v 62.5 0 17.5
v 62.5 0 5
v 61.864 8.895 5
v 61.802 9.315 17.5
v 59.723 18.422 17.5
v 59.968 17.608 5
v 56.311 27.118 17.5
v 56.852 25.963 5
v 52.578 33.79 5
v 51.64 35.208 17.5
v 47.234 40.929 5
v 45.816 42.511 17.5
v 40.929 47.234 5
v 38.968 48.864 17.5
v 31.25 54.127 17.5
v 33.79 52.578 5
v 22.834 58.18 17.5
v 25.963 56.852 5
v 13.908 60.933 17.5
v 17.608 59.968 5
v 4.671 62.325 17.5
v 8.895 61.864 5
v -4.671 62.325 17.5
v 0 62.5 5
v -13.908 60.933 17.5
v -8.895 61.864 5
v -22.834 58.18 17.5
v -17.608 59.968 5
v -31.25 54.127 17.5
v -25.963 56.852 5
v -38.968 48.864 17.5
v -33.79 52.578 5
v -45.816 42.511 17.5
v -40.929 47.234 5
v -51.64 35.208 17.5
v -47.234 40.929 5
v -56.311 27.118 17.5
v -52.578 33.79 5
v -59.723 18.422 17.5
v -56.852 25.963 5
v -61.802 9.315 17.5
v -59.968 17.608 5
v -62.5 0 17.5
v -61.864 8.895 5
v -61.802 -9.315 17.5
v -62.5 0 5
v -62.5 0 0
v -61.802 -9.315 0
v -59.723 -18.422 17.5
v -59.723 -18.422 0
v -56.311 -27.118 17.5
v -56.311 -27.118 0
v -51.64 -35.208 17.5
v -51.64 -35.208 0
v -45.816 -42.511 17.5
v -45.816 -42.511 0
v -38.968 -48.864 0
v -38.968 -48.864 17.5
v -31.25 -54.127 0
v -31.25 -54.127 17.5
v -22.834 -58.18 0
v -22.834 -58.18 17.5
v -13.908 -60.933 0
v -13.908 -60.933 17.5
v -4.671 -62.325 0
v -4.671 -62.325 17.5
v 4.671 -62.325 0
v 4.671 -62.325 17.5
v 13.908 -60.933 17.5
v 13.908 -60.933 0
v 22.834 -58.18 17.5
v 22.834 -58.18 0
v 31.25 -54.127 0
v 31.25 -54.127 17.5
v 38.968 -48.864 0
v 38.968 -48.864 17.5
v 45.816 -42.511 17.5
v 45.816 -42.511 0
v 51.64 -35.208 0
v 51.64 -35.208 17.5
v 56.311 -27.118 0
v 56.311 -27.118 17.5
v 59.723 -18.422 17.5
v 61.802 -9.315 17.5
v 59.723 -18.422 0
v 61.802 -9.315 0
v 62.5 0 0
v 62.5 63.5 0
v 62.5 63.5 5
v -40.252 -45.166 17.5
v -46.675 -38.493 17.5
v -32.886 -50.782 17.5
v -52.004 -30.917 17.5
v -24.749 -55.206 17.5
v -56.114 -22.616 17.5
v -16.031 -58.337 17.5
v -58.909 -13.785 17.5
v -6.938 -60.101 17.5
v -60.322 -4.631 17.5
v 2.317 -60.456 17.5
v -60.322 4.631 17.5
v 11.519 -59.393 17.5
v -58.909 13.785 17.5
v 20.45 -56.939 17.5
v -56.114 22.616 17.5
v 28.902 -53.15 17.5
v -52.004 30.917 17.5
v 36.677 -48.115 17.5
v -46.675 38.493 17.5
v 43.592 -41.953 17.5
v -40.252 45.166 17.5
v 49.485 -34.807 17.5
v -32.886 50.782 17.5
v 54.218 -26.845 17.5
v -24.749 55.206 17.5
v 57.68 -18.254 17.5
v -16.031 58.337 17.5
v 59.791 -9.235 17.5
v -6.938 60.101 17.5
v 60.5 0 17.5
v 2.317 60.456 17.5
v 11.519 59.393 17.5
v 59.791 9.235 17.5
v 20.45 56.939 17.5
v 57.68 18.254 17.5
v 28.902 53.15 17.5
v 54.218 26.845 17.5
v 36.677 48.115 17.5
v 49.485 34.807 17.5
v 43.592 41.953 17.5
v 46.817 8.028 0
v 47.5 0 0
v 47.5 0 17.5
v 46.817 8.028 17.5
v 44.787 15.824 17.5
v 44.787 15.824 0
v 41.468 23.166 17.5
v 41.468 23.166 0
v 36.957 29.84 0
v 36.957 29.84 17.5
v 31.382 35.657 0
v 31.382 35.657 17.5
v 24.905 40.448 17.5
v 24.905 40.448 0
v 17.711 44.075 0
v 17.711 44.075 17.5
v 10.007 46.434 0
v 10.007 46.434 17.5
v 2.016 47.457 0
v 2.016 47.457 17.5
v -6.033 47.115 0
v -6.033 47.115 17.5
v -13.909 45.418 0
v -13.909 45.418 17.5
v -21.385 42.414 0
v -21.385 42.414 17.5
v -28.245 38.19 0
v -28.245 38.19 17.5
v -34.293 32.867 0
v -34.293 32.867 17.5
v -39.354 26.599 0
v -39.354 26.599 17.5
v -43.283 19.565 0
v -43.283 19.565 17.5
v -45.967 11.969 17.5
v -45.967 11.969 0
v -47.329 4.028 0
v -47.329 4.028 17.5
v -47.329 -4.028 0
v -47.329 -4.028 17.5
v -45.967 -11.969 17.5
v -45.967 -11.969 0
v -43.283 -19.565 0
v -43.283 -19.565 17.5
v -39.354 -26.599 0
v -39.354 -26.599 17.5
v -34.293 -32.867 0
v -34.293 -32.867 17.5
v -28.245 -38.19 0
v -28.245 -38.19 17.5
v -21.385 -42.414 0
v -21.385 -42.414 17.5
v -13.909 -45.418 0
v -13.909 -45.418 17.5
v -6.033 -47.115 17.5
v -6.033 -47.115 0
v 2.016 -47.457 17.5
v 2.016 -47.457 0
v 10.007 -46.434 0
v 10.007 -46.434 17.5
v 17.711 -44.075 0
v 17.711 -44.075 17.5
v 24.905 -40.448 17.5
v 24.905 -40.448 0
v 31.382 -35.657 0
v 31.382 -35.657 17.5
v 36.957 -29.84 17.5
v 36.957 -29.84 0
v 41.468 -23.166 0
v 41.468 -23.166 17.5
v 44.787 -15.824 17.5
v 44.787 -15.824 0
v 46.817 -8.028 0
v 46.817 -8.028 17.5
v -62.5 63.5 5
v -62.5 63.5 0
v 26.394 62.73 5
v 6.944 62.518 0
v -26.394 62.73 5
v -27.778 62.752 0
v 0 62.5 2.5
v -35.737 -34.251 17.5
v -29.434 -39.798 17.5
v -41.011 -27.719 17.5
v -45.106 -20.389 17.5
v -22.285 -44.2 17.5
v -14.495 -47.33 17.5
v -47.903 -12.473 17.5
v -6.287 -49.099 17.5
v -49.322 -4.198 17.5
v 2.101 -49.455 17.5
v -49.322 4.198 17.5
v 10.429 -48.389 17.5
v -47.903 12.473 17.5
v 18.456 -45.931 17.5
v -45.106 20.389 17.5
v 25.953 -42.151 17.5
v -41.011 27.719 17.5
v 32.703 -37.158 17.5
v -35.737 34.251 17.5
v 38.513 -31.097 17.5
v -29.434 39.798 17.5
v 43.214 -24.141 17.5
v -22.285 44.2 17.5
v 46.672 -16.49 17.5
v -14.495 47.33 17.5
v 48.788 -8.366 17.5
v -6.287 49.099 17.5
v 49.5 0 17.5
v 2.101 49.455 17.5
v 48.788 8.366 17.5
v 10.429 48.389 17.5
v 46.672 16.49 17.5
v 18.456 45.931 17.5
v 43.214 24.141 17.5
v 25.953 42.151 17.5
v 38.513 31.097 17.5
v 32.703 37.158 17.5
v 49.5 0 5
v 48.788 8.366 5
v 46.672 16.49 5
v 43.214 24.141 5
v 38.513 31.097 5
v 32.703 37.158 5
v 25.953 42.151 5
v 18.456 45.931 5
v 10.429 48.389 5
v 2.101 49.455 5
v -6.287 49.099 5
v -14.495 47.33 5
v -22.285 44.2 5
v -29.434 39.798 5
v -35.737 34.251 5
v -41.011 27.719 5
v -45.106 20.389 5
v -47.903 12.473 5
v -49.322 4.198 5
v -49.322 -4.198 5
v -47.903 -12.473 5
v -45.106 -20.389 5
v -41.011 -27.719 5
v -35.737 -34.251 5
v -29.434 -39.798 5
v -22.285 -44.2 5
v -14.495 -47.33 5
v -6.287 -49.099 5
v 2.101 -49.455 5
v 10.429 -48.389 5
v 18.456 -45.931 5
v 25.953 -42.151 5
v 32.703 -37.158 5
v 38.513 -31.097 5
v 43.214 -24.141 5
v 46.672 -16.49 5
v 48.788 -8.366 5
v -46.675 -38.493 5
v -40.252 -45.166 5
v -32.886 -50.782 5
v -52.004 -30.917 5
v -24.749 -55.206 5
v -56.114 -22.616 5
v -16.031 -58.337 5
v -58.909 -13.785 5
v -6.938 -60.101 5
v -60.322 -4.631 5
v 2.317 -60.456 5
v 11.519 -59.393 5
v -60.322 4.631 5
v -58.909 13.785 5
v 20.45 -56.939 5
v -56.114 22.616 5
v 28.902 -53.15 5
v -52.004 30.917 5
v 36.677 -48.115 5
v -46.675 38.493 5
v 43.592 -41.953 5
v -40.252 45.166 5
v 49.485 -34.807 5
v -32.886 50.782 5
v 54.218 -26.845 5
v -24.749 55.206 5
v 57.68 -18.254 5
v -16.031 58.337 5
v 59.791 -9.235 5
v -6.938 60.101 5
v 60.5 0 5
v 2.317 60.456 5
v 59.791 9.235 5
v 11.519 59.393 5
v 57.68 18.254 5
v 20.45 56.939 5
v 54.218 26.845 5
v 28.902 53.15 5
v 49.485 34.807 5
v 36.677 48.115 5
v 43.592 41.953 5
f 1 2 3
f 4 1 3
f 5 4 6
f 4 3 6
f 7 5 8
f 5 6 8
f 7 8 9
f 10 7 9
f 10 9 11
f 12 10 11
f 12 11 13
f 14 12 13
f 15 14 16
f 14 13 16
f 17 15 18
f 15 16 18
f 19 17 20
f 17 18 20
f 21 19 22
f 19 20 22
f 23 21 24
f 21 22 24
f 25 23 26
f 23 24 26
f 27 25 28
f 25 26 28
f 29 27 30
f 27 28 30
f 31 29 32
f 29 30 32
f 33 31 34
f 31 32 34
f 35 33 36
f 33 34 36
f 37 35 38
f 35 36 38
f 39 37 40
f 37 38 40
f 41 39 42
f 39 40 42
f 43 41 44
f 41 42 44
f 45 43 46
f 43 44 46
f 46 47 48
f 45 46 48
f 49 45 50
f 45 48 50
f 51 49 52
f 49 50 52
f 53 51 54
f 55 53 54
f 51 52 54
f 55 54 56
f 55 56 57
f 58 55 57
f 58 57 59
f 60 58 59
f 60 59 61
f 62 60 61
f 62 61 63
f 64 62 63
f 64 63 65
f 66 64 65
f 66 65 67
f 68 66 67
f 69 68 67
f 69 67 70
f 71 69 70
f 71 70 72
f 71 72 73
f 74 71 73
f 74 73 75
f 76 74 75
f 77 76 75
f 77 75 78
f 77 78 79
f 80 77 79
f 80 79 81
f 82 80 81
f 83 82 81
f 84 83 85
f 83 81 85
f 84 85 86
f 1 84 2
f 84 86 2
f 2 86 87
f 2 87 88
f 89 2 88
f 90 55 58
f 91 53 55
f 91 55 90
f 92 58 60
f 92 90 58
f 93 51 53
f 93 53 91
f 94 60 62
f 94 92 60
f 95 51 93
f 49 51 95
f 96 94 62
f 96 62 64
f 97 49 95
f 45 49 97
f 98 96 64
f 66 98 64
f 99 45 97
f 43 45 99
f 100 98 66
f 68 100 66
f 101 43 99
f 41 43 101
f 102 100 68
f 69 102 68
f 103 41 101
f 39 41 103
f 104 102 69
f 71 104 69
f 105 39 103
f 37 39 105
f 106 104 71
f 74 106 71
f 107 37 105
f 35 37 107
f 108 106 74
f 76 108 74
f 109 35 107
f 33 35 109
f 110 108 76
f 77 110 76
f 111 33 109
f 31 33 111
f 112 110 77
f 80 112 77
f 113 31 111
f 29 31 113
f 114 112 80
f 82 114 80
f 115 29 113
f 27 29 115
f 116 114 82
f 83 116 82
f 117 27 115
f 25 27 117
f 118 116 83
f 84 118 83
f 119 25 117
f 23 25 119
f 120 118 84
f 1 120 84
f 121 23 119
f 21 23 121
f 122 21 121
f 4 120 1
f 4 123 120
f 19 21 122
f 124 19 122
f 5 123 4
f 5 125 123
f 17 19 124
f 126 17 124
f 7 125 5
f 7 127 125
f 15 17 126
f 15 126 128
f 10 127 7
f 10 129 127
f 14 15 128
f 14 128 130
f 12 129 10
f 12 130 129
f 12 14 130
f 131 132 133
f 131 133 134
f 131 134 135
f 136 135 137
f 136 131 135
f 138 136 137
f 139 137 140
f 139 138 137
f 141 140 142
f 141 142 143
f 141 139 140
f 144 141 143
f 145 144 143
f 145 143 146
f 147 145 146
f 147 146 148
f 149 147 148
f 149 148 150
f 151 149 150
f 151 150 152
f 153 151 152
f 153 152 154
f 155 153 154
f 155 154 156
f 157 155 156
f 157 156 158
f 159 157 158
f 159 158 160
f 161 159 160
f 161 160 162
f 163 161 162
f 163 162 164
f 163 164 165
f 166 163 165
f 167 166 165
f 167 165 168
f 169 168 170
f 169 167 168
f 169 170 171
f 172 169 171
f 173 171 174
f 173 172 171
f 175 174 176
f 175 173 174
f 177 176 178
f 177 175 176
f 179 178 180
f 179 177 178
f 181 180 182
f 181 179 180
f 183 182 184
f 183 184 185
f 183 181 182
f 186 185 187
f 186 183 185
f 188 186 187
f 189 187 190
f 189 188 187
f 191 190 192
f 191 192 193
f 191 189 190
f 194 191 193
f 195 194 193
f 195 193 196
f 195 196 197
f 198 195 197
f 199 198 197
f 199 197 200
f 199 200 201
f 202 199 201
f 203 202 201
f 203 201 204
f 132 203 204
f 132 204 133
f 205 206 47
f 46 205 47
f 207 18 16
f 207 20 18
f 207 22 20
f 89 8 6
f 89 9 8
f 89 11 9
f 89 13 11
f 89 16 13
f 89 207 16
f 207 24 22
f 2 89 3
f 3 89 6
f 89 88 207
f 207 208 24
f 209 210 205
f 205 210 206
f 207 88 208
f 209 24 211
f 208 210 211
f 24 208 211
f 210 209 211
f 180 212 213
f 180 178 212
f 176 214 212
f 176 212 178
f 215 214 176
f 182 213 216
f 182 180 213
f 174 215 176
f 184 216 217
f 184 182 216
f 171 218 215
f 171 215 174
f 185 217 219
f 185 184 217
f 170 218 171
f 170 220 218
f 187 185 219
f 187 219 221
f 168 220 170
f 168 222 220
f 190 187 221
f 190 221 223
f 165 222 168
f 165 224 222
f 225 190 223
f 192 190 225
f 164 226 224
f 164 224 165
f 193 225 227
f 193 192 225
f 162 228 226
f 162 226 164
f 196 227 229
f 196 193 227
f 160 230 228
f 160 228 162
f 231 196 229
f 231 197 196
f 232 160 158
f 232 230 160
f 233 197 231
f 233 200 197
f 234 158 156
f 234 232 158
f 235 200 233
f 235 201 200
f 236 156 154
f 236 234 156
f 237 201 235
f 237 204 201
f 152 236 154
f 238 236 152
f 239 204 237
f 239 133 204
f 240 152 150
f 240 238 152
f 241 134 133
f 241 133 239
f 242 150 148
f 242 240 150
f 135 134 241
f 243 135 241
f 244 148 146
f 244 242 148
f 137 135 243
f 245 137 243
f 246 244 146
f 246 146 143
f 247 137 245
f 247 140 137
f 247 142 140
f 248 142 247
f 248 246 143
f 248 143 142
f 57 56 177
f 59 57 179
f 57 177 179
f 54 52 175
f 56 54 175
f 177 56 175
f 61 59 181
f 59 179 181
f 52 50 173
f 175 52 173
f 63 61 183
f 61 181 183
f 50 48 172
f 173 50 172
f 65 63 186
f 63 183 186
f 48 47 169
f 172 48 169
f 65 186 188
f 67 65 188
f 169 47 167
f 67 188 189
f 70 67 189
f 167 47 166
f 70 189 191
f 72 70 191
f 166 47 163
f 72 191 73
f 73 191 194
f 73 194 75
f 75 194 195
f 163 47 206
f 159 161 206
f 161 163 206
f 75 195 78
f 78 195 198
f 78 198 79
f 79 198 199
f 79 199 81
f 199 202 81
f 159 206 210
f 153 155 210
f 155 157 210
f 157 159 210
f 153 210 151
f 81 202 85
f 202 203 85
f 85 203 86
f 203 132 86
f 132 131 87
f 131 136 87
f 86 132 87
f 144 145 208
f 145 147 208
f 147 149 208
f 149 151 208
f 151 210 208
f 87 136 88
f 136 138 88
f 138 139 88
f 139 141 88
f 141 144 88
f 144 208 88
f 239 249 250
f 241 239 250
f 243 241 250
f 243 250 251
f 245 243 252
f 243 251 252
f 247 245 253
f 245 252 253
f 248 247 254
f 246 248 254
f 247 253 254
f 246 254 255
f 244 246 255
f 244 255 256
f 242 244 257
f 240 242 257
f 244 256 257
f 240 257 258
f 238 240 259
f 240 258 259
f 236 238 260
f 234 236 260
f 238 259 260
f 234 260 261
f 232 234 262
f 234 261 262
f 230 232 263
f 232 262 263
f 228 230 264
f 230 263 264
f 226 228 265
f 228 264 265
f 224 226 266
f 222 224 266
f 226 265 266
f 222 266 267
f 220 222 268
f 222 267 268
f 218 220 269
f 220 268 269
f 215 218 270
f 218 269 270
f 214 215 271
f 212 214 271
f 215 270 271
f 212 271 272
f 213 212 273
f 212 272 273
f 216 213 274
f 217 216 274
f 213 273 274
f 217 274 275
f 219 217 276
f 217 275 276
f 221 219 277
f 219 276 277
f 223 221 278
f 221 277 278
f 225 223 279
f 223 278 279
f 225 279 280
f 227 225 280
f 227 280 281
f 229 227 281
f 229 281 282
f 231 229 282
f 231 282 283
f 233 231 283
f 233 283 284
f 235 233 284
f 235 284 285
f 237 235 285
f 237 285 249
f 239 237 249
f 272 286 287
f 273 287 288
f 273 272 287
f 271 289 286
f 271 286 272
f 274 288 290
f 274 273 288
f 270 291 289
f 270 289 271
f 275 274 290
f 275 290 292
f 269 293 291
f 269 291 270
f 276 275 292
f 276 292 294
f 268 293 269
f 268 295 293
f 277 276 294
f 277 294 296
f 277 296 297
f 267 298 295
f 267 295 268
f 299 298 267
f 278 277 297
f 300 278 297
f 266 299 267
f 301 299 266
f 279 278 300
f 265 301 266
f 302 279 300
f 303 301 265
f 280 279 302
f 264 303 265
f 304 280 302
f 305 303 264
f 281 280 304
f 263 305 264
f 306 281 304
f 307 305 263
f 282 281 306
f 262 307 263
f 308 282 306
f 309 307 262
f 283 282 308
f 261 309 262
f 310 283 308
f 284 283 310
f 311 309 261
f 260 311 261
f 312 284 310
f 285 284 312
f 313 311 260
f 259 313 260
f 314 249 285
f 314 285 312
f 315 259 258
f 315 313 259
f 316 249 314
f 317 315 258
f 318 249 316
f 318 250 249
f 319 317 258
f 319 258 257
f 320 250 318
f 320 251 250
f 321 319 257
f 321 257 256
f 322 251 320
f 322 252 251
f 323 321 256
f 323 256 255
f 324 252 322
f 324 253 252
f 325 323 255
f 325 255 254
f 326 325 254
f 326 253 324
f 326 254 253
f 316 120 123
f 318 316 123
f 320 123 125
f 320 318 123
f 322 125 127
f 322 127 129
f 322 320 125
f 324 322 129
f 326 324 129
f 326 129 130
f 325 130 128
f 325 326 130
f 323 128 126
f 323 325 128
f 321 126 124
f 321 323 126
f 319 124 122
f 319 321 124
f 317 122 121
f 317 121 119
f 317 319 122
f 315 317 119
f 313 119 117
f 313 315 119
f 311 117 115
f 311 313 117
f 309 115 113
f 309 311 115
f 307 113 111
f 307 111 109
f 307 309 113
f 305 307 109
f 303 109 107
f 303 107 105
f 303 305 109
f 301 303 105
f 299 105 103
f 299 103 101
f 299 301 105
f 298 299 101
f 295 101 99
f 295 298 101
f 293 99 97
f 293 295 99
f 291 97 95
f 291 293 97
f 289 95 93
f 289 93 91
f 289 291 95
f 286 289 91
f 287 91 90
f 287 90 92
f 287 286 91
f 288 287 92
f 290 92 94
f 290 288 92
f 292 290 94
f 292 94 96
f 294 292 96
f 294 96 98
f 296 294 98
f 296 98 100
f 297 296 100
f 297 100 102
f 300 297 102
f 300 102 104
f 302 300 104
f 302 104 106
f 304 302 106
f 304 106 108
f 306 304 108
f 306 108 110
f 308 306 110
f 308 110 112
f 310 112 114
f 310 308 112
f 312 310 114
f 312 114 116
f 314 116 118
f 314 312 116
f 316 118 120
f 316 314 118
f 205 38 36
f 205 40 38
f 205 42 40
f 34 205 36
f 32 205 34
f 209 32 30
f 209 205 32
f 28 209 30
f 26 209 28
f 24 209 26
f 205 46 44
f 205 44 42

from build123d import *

# Parameters (mm, degrees)
F0_R     = 47.5
F1_DEPTH = 5
F2_R     = 62.5
F2_R_2   = 60.5
F2_R_3   = 49.5
F2_R_4   = 47.5
F3_DEPTH = 12.5


with BuildPart() as f1:
    # F0 (on Top) → F1 (new body)
    with BuildSketch(Plane.XY):
        with BuildLine():
            ThreePointArc((-7.47e-08, 62.5), (-44.1941738506, 44.1941737978), (-62.5, 0))
            ThreePointArc((-62.5, 0), (0, -62.5), (62.5, 0))
            ThreePointArc((62.5, 0), (44.1941737978, 44.1941738506), (-7.47e-08, 62.5))
        make_face()
        Circle(F0_R, mode=Mode.SUBTRACT)
        with BuildLine():
            Line((-62.5, 63.5), (-62.5, 0))
            ThreePointArc((-62.5, 0), (-44.1941738506, 44.1941737978), (-7.47e-08, 62.5))
            add(Edge.make_bspline(
                [(-62.5, 63.5), (-41.6666666667, 63), (-20.8333333333, 62.5), (0, 62.5)],
                knots=[0, 0, 0, 0, 0.5, 0.5, 0.5, 0.5], degree=3))
        make_face()
        with BuildLine():
            ThreePointArc((-7.47e-08, 62.5), (44.1941737978, 44.1941738506), (62.5, 0))
            Line((62.5, 0), (62.5, 63.5))
            add(Edge.make_bspline(
                [(0, 62.5), (20.8333333333, 62.5), (41.6666666667, 63), (62.5, 63.5)],
                knots=[0.5, 0.5, 0.5, 0.5, 1, 1, 1, 1], degree=3))
        make_face()
    extrude(amount=F1_DEPTH)

    # F2 (on face) → F3 (join)
    with BuildSketch(Plane.XY.offset(5)):
        Circle(F2_R)
        Circle(F2_R_2, mode=Mode.SUBTRACT)
        Circle(F2_R_3)
        Circle(F2_R_4, mode=Mode.SUBTRACT)
    extrude(amount=F3_DEPTH)


solid = f1.part
